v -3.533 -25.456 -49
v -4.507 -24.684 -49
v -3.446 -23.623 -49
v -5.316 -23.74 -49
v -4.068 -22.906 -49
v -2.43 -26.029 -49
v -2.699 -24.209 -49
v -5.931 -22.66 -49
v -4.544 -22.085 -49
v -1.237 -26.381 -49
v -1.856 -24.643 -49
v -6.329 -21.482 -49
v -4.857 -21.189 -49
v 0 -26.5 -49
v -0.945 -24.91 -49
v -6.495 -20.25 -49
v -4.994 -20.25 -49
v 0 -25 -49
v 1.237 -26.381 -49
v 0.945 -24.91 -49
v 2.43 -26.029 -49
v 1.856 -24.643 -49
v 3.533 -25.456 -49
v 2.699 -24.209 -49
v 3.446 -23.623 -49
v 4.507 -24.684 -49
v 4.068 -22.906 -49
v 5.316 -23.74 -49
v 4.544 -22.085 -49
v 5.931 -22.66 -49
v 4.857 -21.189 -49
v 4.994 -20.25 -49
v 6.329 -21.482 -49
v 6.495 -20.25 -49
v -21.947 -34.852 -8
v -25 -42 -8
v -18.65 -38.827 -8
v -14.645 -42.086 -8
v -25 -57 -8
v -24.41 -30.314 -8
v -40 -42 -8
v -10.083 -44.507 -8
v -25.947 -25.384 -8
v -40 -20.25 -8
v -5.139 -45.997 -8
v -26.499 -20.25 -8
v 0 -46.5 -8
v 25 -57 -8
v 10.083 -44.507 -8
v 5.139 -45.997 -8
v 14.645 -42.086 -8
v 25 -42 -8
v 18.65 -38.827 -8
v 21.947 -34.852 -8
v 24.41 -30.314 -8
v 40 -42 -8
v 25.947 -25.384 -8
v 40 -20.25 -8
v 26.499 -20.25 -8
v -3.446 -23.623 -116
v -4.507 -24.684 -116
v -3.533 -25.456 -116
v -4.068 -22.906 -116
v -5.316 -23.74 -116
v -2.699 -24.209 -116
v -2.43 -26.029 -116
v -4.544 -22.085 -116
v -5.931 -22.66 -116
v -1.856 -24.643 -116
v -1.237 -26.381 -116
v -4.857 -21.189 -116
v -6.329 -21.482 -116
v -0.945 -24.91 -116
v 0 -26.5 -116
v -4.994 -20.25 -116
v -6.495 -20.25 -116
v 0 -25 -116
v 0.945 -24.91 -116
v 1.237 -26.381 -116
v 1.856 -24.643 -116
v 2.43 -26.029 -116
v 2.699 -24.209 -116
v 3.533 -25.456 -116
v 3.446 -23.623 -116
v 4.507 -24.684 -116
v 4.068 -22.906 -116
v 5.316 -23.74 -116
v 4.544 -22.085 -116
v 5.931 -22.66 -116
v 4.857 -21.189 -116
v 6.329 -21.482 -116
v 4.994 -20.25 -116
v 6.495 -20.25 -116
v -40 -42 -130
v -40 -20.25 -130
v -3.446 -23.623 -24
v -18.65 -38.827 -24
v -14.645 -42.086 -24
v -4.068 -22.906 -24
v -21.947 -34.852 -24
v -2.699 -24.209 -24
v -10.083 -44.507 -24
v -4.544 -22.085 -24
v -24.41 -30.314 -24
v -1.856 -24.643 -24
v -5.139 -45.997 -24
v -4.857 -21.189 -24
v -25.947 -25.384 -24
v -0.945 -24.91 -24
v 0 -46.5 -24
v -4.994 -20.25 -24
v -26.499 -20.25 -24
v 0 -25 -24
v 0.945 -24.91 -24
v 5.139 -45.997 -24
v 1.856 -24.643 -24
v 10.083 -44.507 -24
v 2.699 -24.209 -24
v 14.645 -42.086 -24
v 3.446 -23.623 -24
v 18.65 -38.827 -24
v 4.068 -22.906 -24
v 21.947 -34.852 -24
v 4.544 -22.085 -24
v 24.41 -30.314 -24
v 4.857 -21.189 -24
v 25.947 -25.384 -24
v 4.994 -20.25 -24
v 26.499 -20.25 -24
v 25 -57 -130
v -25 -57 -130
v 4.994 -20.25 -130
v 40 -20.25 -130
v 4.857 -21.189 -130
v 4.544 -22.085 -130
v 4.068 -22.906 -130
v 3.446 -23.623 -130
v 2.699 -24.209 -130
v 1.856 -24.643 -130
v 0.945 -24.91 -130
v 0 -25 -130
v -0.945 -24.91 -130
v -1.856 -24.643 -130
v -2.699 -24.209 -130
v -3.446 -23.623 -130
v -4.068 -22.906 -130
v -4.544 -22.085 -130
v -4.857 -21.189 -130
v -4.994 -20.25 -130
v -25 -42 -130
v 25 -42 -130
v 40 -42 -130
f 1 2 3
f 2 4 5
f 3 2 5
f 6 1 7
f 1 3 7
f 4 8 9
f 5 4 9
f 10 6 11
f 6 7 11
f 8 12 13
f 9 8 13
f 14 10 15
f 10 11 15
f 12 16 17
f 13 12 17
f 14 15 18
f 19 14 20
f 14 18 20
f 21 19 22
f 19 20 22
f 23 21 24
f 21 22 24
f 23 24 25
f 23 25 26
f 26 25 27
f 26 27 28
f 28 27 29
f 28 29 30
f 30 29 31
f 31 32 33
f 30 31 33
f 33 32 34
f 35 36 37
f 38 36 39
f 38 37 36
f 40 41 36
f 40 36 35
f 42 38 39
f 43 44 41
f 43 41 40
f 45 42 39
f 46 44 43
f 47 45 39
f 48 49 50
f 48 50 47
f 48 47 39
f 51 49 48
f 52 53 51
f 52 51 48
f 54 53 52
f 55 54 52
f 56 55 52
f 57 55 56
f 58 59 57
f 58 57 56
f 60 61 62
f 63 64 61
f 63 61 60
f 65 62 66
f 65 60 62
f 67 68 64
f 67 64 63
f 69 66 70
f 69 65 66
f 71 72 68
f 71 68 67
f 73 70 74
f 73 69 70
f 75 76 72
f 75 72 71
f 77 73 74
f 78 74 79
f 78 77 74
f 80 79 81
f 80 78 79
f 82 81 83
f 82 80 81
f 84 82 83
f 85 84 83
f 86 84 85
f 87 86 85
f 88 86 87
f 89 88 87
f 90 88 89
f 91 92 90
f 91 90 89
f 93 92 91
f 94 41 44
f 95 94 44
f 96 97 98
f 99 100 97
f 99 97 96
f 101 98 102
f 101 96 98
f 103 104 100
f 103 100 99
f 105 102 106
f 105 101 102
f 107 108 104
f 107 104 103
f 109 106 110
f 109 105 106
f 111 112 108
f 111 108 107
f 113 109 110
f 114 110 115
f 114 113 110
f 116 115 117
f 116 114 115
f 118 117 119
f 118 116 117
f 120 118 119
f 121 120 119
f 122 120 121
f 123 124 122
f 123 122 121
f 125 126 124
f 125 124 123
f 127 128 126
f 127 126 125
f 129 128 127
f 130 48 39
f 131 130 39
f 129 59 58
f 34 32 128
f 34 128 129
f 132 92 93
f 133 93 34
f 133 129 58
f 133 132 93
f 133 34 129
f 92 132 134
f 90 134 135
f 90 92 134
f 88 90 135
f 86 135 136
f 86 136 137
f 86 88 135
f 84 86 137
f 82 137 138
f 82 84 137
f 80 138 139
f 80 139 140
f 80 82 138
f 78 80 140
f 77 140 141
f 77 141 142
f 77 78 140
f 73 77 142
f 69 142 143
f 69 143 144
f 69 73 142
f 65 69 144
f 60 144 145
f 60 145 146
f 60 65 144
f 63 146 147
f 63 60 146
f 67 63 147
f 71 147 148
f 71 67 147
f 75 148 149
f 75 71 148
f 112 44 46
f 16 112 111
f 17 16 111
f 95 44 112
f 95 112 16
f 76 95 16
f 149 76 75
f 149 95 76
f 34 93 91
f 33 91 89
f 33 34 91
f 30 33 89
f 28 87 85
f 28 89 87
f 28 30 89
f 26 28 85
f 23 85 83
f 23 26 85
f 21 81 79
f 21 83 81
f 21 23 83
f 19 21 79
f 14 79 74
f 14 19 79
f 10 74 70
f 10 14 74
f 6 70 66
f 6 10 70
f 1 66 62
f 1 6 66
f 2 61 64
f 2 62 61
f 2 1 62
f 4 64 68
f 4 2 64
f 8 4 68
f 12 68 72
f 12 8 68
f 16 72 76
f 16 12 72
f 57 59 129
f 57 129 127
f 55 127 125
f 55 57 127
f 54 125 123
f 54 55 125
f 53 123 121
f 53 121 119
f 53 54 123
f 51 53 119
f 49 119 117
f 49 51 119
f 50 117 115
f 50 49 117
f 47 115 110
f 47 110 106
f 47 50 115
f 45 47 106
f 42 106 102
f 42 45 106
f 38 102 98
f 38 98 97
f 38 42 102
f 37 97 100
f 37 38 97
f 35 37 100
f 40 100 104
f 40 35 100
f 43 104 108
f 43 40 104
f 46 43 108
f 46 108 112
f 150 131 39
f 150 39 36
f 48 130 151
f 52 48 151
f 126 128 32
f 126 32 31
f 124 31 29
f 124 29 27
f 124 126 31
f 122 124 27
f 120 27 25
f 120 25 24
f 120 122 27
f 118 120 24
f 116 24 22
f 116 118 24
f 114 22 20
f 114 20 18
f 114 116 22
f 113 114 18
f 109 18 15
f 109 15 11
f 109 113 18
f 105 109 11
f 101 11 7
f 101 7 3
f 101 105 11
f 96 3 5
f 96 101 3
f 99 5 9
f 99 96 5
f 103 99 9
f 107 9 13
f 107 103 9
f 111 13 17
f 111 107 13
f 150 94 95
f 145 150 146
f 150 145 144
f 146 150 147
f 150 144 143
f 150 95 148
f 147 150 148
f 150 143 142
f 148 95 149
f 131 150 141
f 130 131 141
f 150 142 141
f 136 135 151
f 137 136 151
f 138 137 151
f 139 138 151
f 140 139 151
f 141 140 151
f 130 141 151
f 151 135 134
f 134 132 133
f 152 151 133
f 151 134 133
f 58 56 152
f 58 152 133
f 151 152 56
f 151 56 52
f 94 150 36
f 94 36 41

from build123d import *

# Parameters (mm, degrees)
BOSS_EXTRUDE1_DEPTH     = 8
SKETCH3_R               = 13.75
CUT_EXTRUDE1_DEPTH      = 8
SKETCH4_W               = 80
SKETCH4_H               = 37
BOSS_EXTRUDE2_DEPTH     = 122
SKETCH5_R               = 26.5
CUT_EXTRUDE2_DEPTH      = 16
SKETCH6_R               = 6.5
CUT_EXTRUDE3_DEPTH      = 122
BOSS_EXTRUDE3_START     = 16
BOSS_EXTRUDE3_DEPTH     = 25
BOSS_EXTRUDE4_START     = 108
BOSS_EXTRUDE4_DEPTH     = 14
SKETCH10_W              = 150
SKETCH10_H              = 175
CUT_EXTRUDE4_DEPTH      = 8
CUT_EXTRUDE5_DEPTH      = 141.474196919
CUT_EXTRUDE5_DEPTH_BACK = 141.474196919
SKETCH12_W              = 80
SKETCH12_H              = 0.25
SKETCH13_W              = 15
SKETCH13_H              = 15
CUT_EXTRUDE6_DEPTH      = 122


with BuildPart() as part:
    # Sketch2 → Boss-Extrude1 (new body)
    with BuildSketch(Plane.XY):
        with BuildLine():
            Line((-35, 60), (-35, 50))
            ThreePointArc((-35, 50), (-37.196699141, 44.696699141), (-42.5, 42.5))
            Line((-42.5, 42.5), (-52.5, 42.5))
            ThreePointArc((-52.5, 42.5), (-57.803300859, 40.303300859), (-60, 35))
            Line((-60, 35), (-60, -60))
            ThreePointArc((-60, -60), (-57.803300859, -65.303300859), (-52.5, -67.5))
            Line((-52.5, -67.5), (52.5, -67.5))
            ThreePointArc((52.5, -67.5), (57.803300859, -65.303300859), (60, -60))
            Line((60, -60), (60, 35))
            ThreePointArc((60, 35), (57.803300859, 40.303300859), (52.5, 42.5))
            Line((52.5, 42.5), (42.5, 42.5))
            ThreePointArc((42.5, 42.5), (37.196699141, 44.696699141), (35, 50))
            Line((35, 50), (35, 60))
            ThreePointArc((35, 60), (32.803300859, 65.303300859), (27.5, 67.5))
            Line((27.5, 67.5), (-27.5, 67.5))
            ThreePointArc((-27.5, 67.5), (-32.803300859, 65.303300859), (-35, 60))
        make_face()
    extrude(amount=-BOSS_EXTRUDE1_DEPTH)

    # Sketch3 → Cut-Extrude1 (cut)
    with BuildSketch(Plane.XY):
        with Locations((0, -20)):
            Circle(SKETCH3_R)
    extrude(amount=-CUT_EXTRUDE1_DEPTH, mode=Mode.SUBTRACT)

    # Sketch4 → Boss-Extrude2 (add)
    with BuildSketch(Plane(origin=(0, 0, -8), x_dir=(-1, 0, 0), z_dir=(0, 0, -1))):
        with Locations((0, -38.5)):
            Rectangle(SKETCH4_W, SKETCH4_H)
    extrude(amount=BOSS_EXTRUDE2_DEPTH)

    # Sketch5 → Cut-Extrude2 (cut)
    with BuildSketch(Plane(origin=(0, 0, -8), x_dir=(-1, 0, 0), z_dir=(0, 0, -1))):
        with Locations((0, -20)):
            Circle(SKETCH5_R)
    extrude(amount=CUT_EXTRUDE2_DEPTH, mode=Mode.SUBTRACT)

    # Sketch6 → Cut-Extrude3 (cut)
    with BuildSketch(Plane(origin=(0, 0, -8), x_dir=(-1, 0, 0), z_dir=(0, 0, -1))):
        with Locations((0, -20)):
            Circle(SKETCH6_R)
    extrude(amount=CUT_EXTRUDE3_DEPTH, mode=Mode.SUBTRACT)

    # Sketch8 → Boss-Extrude3 (add)
    with BuildSketch(Plane(origin=(0, 0, -8), x_dir=(-1, 0, 0), z_dir=(0, 0, -1)).offset(BOSS_EXTRUDE3_START)):
        with BuildLine():
            Line((-6.5, -20), (-5, -20))
            ThreePointArc((-5, -20), (0, -25), (5, -20))
            Line((5, -20), (6.5, -20))
            ThreePointArc((6.5, -20), (0, -26.5), (-6.5, -20))
        make_face()
    extrude(amount=BOSS_EXTRUDE3_DEPTH)

    # Sketch9 → Boss-Extrude4 (add)
    with BuildSketch(Plane(origin=(0, 0, -8), x_dir=(-1, 0, 0), z_dir=(0, 0, -1)).offset(BOSS_EXTRUDE4_START)):
        with BuildLine():
            Line((-6.5, -20), (-5, -20))
            ThreePointArc((-5, -20), (0, -25), (5, -20))
            Line((5, -20), (6.5, -20))
            ThreePointArc((6.5, -20), (0, -26.5), (-6.5, -20))
        make_face()
    extrude(amount=BOSS_EXTRUDE4_DEPTH)

    # Sketch10 → Cut-Extrude4 (cut)
    with BuildSketch(Plane.XY):
        Rectangle(SKETCH10_W, SKETCH10_H)
    extrude(amount=-CUT_EXTRUDE4_DEPTH, mode=Mode.SUBTRACT)

    # Sketch12 → Cut-Extrude5 (cut, two sides: drawn at the far end of the back side and taken through both)
    with BuildSketch(Plane.XY.offset(-8).offset(-CUT_EXTRUDE5_DEPTH_BACK)):
        with Locations((0, -20.125)):
            Rectangle(SKETCH12_W, SKETCH12_H)
    extrude(amount=CUT_EXTRUDE5_DEPTH + CUT_EXTRUDE5_DEPTH_BACK, mode=Mode.SUBTRACT)

    # Sketch13 → Cut-Extrude6 (cut)
    with BuildSketch(Plane(origin=(0, 0, -130), x_dir=(-1, 0, 0), z_dir=(0, 0, -1))):
        with Locations((32.5, -49.5)):
            Rectangle(SKETCH13_W, SKETCH13_H)
        with Locations((-32.5, -49.5)):
            Rectangle(SKETCH13_W, SKETCH13_H)
    extrude(amount=-CUT_EXTRUDE6_DEPTH, mode=Mode.SUBTRACT)


solid = part.part
